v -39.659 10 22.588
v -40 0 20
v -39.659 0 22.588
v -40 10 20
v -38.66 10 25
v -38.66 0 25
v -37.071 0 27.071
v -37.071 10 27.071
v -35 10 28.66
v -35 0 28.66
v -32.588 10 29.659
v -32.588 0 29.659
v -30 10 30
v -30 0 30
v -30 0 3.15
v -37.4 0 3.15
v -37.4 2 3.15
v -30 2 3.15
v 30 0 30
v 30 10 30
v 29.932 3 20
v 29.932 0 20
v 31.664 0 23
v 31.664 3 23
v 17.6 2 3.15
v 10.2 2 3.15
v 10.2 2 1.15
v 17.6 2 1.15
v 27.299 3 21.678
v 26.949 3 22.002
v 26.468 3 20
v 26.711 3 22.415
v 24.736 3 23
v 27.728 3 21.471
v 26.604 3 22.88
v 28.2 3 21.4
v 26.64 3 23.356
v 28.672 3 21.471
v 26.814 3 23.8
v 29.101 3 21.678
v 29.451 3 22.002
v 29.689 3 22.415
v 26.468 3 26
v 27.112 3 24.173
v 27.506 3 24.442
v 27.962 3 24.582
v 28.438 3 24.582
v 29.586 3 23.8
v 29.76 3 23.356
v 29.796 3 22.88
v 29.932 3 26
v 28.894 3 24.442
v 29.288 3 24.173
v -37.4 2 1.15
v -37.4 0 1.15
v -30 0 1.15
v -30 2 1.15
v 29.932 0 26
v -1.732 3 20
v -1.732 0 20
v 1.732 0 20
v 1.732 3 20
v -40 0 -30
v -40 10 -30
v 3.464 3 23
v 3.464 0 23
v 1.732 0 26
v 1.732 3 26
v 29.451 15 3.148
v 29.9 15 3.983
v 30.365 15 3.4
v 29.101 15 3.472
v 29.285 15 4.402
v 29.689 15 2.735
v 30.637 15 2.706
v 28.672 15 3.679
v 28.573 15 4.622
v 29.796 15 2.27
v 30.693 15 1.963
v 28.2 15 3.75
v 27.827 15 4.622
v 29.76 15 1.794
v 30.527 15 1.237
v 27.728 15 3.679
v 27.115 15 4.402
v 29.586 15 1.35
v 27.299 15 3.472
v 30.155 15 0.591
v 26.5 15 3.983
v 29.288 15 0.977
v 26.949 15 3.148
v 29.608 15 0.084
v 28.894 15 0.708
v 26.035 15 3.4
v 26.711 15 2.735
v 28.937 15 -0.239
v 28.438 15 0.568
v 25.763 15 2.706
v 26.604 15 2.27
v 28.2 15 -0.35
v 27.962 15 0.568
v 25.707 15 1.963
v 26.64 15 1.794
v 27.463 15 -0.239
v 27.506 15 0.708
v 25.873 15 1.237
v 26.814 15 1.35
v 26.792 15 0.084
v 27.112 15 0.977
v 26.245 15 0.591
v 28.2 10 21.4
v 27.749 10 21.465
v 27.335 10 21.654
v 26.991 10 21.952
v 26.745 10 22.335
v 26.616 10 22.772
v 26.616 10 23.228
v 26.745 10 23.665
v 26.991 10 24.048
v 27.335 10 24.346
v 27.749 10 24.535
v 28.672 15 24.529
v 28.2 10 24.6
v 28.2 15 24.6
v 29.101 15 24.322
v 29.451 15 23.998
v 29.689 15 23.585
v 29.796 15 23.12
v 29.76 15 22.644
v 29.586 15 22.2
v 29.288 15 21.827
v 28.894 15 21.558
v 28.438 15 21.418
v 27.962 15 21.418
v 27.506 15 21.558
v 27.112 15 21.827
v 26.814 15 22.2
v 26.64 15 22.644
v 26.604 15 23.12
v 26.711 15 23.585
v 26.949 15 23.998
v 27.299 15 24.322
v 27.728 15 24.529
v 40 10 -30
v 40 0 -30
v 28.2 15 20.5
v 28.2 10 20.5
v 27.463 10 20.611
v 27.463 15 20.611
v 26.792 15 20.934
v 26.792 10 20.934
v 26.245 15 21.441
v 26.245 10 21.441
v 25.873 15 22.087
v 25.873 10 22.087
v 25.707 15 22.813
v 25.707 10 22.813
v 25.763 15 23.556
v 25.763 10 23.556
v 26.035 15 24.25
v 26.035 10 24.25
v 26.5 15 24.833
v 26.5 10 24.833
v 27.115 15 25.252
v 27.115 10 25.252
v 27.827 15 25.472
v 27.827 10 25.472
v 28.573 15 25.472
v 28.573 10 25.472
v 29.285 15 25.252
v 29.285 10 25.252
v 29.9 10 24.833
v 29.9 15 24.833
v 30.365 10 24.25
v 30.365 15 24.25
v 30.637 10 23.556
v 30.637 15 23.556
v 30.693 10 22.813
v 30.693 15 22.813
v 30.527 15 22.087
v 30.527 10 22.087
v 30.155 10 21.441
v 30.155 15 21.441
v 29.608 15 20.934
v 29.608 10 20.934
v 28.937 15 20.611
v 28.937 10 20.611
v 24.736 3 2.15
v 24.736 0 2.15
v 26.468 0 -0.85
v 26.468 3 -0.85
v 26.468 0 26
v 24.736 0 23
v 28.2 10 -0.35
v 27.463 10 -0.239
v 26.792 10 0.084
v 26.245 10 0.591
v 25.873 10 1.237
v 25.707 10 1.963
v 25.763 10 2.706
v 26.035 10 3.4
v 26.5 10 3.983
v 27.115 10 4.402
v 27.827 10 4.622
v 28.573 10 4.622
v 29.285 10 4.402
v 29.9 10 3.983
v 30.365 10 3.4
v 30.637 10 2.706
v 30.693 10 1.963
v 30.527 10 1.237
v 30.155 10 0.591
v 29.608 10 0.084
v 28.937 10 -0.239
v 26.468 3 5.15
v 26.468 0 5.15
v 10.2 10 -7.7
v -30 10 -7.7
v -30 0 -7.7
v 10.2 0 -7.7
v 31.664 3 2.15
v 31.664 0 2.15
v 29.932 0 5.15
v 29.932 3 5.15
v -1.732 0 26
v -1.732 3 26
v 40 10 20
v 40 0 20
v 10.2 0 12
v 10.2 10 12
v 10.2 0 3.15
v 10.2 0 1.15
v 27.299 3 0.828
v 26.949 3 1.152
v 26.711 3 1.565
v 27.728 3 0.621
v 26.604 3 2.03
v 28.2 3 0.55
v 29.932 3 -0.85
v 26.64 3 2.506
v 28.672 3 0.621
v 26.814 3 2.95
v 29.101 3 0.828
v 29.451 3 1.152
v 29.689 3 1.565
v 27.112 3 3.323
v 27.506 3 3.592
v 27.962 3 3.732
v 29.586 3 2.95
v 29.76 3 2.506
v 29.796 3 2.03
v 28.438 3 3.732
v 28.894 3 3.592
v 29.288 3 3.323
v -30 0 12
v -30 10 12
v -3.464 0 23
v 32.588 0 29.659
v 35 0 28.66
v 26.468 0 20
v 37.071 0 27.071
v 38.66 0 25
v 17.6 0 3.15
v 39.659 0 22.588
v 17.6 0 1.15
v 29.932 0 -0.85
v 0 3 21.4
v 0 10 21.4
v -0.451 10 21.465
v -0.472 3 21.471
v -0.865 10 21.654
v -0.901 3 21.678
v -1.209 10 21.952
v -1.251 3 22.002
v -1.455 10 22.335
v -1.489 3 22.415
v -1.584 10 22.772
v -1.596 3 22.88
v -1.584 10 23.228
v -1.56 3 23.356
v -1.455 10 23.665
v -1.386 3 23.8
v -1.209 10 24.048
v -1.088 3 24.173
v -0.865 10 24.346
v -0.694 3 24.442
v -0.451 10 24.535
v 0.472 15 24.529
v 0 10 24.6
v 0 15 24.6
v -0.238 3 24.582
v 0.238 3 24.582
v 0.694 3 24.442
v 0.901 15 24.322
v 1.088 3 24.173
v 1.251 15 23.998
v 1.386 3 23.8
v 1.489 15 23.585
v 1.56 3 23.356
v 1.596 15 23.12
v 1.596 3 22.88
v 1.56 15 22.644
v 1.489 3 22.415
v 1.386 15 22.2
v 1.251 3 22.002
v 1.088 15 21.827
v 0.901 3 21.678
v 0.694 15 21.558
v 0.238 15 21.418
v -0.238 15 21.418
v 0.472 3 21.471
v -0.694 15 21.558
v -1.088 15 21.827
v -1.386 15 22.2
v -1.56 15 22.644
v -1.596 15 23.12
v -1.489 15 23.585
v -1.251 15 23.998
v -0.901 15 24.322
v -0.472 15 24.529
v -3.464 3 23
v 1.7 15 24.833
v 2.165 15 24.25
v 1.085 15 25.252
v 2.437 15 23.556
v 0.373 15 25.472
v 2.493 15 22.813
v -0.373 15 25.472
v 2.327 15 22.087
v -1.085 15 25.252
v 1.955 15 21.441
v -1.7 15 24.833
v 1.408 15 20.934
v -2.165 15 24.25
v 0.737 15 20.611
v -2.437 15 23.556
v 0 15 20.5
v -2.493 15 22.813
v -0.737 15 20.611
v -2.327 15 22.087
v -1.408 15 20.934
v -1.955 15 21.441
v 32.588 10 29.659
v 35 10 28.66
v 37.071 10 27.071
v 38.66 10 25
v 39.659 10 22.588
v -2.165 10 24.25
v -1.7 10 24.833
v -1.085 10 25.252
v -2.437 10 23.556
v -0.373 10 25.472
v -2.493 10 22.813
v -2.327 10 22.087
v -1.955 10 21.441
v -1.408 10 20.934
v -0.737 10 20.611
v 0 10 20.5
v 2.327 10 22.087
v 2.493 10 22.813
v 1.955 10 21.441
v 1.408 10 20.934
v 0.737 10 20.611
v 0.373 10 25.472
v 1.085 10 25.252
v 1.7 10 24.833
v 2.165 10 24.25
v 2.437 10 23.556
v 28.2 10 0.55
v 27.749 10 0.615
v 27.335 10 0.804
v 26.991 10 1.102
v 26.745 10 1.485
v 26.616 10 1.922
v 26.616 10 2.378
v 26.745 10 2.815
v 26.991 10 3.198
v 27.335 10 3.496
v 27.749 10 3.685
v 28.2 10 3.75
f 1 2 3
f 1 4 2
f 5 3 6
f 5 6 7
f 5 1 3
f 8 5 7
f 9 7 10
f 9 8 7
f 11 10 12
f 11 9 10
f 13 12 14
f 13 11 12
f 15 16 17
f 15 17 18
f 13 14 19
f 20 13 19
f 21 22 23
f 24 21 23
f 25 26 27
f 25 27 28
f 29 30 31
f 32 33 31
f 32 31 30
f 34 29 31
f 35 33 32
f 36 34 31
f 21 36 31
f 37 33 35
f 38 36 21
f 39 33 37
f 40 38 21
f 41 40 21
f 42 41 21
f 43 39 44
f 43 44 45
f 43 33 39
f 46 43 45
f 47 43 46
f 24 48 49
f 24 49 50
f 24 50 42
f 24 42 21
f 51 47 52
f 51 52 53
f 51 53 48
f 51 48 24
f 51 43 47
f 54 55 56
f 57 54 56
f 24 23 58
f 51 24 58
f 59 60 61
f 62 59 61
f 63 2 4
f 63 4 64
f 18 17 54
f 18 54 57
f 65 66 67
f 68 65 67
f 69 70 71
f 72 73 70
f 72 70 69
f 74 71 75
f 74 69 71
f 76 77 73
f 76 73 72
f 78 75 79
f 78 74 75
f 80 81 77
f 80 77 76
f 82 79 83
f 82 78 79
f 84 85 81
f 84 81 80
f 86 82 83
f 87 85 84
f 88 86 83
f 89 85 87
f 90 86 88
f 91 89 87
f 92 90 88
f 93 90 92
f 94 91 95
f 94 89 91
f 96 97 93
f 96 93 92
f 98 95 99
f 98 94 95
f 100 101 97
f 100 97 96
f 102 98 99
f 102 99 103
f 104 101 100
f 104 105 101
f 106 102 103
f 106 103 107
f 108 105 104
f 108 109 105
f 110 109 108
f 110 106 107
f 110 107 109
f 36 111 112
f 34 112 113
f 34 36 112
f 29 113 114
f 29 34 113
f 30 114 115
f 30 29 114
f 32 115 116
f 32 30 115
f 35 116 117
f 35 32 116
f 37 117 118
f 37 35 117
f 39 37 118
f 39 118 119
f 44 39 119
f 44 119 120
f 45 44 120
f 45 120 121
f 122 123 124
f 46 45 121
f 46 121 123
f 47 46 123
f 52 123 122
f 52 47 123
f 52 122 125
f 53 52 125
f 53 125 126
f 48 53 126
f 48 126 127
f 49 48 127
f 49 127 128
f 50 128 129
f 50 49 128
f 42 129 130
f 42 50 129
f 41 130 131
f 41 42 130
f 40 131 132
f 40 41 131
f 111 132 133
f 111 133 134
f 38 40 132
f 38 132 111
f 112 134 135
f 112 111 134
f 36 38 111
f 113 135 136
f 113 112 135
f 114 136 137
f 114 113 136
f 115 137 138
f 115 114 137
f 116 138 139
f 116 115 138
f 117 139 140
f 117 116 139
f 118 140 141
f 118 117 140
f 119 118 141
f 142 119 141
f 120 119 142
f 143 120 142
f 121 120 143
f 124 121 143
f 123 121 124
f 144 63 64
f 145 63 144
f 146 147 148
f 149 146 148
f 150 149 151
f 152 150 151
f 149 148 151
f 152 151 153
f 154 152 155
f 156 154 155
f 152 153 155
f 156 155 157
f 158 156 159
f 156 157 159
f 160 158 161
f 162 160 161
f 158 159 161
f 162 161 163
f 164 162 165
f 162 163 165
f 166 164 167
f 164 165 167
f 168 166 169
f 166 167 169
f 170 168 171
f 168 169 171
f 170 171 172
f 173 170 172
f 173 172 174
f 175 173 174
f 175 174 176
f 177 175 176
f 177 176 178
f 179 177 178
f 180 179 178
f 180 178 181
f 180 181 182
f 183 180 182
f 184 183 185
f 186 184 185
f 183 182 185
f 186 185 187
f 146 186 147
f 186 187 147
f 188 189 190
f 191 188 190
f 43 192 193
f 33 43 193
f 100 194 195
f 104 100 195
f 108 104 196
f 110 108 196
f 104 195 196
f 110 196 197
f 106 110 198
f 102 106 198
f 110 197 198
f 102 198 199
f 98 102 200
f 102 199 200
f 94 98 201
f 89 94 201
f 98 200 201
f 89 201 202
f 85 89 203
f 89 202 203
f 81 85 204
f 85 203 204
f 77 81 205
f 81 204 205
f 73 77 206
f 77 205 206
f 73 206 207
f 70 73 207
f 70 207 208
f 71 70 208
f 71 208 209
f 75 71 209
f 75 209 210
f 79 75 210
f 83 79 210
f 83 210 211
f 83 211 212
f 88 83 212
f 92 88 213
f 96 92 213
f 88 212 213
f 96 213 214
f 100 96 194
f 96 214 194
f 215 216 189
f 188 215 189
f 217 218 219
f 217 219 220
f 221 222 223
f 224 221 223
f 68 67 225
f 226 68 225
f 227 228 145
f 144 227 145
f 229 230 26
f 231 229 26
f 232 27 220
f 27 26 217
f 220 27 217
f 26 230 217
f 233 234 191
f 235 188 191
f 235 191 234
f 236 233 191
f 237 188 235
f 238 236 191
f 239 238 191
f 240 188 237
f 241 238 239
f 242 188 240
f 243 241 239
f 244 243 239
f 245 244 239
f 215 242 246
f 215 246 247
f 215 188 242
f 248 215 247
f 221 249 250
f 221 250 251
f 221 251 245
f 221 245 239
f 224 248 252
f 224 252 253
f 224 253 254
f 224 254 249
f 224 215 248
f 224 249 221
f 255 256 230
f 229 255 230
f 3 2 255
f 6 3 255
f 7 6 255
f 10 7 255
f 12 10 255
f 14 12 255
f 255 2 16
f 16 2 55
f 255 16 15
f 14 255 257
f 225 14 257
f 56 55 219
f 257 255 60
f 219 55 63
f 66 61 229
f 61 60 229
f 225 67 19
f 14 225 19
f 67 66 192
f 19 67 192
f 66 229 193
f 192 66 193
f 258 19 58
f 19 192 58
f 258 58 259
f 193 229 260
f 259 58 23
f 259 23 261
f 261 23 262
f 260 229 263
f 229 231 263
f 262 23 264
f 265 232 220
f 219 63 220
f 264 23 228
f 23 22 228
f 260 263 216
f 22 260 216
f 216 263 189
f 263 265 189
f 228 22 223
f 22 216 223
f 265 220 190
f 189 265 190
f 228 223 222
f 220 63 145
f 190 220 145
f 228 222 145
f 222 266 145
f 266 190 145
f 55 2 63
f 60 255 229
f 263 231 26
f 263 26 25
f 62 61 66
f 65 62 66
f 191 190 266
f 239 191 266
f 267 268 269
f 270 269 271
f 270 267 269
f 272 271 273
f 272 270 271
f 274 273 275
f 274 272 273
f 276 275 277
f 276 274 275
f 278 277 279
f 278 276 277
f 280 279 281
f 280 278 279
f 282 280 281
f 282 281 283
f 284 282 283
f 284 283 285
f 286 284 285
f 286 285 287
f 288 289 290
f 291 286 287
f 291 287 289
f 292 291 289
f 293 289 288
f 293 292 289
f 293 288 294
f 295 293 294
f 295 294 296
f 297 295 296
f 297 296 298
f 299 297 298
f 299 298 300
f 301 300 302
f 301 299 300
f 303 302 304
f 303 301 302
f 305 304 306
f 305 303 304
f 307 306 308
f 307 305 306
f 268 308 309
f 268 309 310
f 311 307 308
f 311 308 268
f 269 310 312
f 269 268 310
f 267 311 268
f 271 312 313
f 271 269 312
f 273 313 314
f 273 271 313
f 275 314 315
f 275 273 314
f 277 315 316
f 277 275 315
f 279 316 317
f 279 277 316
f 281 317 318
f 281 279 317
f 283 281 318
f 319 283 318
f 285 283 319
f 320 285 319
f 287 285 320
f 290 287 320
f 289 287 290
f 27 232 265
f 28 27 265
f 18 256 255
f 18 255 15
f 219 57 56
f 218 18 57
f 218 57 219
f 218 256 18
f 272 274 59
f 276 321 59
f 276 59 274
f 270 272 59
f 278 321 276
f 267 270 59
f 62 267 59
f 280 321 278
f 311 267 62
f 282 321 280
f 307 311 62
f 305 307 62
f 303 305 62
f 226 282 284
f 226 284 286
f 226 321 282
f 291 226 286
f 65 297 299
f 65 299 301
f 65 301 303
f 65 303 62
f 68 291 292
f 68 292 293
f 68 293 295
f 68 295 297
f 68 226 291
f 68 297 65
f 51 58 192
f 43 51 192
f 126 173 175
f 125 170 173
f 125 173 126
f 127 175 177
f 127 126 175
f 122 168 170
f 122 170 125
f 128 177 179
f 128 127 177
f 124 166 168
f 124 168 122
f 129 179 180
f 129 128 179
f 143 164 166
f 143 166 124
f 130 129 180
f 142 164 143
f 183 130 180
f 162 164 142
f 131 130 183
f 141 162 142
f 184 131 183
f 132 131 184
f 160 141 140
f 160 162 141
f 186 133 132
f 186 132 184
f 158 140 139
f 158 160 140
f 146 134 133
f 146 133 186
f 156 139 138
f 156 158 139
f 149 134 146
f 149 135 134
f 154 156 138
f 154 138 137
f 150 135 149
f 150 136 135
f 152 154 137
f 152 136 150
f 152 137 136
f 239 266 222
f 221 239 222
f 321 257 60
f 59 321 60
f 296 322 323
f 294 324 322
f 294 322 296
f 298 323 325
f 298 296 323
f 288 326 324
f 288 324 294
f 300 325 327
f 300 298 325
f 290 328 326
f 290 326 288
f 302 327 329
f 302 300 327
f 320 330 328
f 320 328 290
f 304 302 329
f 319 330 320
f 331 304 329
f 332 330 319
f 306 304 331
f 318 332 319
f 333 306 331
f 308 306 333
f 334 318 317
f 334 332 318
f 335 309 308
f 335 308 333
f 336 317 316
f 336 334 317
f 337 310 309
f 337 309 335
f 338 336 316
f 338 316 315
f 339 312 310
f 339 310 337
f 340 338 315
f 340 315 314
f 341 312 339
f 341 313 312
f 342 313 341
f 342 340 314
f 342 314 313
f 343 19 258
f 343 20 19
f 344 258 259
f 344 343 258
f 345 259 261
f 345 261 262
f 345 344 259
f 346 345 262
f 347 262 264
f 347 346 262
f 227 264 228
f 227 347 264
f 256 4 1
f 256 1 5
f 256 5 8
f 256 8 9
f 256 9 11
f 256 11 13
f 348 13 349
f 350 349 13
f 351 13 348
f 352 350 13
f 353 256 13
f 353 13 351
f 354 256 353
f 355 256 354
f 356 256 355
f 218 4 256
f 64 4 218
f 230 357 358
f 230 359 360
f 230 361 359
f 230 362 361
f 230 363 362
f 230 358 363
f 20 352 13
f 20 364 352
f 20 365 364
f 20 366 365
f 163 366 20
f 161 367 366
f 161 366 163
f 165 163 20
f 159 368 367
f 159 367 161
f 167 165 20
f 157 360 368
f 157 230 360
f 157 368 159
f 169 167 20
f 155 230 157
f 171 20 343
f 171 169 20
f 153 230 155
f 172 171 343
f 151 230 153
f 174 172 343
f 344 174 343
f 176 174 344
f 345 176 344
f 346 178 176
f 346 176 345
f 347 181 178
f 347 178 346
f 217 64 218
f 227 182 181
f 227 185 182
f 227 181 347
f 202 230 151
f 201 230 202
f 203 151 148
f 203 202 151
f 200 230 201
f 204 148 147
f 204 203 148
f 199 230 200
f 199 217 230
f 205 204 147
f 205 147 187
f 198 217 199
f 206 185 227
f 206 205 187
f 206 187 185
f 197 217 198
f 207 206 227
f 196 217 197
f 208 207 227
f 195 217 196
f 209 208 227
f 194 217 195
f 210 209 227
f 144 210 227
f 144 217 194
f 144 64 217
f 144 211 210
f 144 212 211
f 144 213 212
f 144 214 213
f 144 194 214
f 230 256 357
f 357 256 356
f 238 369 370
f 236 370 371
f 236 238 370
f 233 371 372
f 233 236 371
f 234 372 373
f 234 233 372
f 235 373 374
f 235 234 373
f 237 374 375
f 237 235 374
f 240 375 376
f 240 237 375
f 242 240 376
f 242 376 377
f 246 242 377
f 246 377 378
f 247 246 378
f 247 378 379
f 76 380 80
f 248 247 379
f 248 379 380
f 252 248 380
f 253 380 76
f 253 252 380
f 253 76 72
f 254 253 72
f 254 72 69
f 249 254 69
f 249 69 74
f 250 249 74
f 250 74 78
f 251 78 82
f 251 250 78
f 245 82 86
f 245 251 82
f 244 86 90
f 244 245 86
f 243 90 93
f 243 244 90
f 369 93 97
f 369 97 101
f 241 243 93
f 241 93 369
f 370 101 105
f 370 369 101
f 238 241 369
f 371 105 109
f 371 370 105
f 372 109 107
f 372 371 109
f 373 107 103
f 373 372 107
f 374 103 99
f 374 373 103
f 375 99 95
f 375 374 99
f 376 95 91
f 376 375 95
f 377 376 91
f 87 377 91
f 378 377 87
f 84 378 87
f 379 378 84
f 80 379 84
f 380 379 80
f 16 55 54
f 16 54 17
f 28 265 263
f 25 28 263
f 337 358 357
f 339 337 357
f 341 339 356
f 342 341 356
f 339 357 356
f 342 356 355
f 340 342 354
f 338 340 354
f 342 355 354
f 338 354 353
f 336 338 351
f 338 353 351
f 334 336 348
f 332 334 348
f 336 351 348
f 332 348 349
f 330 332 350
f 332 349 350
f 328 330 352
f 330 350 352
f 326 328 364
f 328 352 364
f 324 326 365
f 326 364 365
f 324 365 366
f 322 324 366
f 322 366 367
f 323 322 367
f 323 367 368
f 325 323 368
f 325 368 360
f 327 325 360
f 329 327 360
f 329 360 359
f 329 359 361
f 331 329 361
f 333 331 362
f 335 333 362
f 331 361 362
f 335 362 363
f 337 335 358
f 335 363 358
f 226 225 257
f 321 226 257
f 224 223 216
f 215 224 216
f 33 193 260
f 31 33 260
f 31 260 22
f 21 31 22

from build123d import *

# Parameters (mm, degrees)
SKETCH2_W           = 80
SKETCH2_H           = 60
BOSS_EXTRUDE1_DEPTH = 10
SKETCH3_W           = 40.2
SKETCH3_H           = 19.7
CUT_EXTRUDE1_DEPTH  = 10
FILLET1_R           = 10
SKETCH4_R           = 2.5
SKETCH4_R_2         = 1.6
BOSS_EXTRUDE2_DEPTH = 5
CUT_EXTRUDE2_START  = -21
SKETCH5_R           = 1.6
CUT_EXTRUDE2_DEPTH  = 21
SKETCH7_W           = 55
SKETCH7_H           = 2
CUT_EXTRUDE3_DEPTH  = 2
CUT_EXTRUDE4_DEPTH  = 3


with BuildPart() as part:
    # Sketch2 → Boss-Extrude1 (new body)
    with BuildSketch(Plane(origin=(0, 0, 0), x_dir=(1, 0, 0), z_dir=(0, 1, 0))):
        Rectangle(SKETCH2_W, SKETCH2_H)
    extrude(amount=BOSS_EXTRUDE1_DEPTH)

    # Sketch3 → Cut-Extrude1 (cut)
    with BuildSketch(Plane(origin=(0, 10, 0), x_dir=(1, 0, 0), z_dir=(0, 1, 0))):
        with Locations((-9.9, -2.15)):
            Rectangle(SKETCH3_W, SKETCH3_H)
    extrude(amount=-CUT_EXTRUDE1_DEPTH, mode=Mode.SUBTRACT)

    # Fillet1
    fillet1_edges = [part.edges().sort_by_distance(p)[0] for p in [
        (40, 5, 30),
        (-40, 5, 30),
    ]]
    fillet(fillet1_edges, radius=FILLET1_R)

    # Sketch4 → Boss-Extrude2 (add)
    # profile 1 of 3: a face of its own
    with BuildSketch(Plane(origin=(0, 10, 0), x_dir=(1, 0, 0), z_dir=(0, 1, 0))):
        with Locations(Location((28.2, -2.15, 0), (0, 0, 90))):
            Circle(SKETCH4_R)
        with Locations(Location((28.2, -2.15, 0), (0, 0, 270))):
            Circle(SKETCH4_R_2, mode=Mode.SUBTRACT)
    # profile 2 of 3: a face of its own
    with BuildSketch(Plane(origin=(0, 10, 0), x_dir=(1, 0, 0), z_dir=(0, 1, 0))):
        with Locations(Location((0, -23, 0), (0, 0, 90))):
            Circle(SKETCH4_R)
        with Locations(Location((0, -23, 0), (0, 0, 270))):
            Circle(SKETCH4_R_2, mode=Mode.SUBTRACT)
    # profile 3 of 3: a face of its own
    with BuildSketch(Plane(origin=(0, 10, 0), x_dir=(1, 0, 0), z_dir=(0, 1, 0))):
        with Locations(Location((28.2, -23, 0), (0, 0, 90))):
            Circle(SKETCH4_R)
        with Locations(Location((28.2, -23, 0), (0, 0, 270))):
            Circle(SKETCH4_R_2, mode=Mode.SUBTRACT)
    extrude(amount=BOSS_EXTRUDE2_DEPTH)

    # Sketch5 → Cut-Extrude2 (cut)
    with BuildSketch(Plane(origin=(0, 10, 0), x_dir=(1, 0, 0), z_dir=(0, 1, 0)).offset(CUT_EXTRUDE2_START)):
        with Locations(Location((0, -23, 0), (0, 0, 90))):
            Circle(SKETCH5_R)
        with Locations(Location((28.2, -23, 0), (0, 0, 90))):
            Circle(SKETCH5_R)
        with Locations(Location((28.2, -2.15, 0), (0, 0, 90))):
            Circle(SKETCH5_R)
    extrude(amount=CUT_EXTRUDE2_DEPTH, mode=Mode.SUBTRACT)

    # Sketch7 → Cut-Extrude3 (cut)
    with BuildSketch(Plane.XZ):
        with Locations((-9.9, 2.15)):
            Rectangle(SKETCH7_W, SKETCH7_H)
    extrude(amount=-CUT_EXTRUDE3_DEPTH, mode=Mode.SUBTRACT)

    # Sketch8 → Cut-Extrude4 (cut)
    with BuildSketch(Plane.XZ):
        Polygon((3.464101615, 23), (1.732050808, 26), (-1.732050808, 26), (-3.464101615, 23), (-1.732050808, 20), (1.732050808, 20), align=None)
        Polygon((31.664101615, 23), (29.932050808, 26), (26.467949192, 26), (24.735898385, 23), (26.467949192, 20), (29.932050808, 20), align=None)
        Polygon((31.664101615, 2.15), (29.932050808, 5.15), (26.467949192, 5.15), (24.735898385, 2.15), (26.467949192, -0.85), (29.932050808, -0.85), align=None)
    extrude(amount=-CUT_EXTRUDE4_DEPTH, mode=Mode.SUBTRACT)


solid = part.part
